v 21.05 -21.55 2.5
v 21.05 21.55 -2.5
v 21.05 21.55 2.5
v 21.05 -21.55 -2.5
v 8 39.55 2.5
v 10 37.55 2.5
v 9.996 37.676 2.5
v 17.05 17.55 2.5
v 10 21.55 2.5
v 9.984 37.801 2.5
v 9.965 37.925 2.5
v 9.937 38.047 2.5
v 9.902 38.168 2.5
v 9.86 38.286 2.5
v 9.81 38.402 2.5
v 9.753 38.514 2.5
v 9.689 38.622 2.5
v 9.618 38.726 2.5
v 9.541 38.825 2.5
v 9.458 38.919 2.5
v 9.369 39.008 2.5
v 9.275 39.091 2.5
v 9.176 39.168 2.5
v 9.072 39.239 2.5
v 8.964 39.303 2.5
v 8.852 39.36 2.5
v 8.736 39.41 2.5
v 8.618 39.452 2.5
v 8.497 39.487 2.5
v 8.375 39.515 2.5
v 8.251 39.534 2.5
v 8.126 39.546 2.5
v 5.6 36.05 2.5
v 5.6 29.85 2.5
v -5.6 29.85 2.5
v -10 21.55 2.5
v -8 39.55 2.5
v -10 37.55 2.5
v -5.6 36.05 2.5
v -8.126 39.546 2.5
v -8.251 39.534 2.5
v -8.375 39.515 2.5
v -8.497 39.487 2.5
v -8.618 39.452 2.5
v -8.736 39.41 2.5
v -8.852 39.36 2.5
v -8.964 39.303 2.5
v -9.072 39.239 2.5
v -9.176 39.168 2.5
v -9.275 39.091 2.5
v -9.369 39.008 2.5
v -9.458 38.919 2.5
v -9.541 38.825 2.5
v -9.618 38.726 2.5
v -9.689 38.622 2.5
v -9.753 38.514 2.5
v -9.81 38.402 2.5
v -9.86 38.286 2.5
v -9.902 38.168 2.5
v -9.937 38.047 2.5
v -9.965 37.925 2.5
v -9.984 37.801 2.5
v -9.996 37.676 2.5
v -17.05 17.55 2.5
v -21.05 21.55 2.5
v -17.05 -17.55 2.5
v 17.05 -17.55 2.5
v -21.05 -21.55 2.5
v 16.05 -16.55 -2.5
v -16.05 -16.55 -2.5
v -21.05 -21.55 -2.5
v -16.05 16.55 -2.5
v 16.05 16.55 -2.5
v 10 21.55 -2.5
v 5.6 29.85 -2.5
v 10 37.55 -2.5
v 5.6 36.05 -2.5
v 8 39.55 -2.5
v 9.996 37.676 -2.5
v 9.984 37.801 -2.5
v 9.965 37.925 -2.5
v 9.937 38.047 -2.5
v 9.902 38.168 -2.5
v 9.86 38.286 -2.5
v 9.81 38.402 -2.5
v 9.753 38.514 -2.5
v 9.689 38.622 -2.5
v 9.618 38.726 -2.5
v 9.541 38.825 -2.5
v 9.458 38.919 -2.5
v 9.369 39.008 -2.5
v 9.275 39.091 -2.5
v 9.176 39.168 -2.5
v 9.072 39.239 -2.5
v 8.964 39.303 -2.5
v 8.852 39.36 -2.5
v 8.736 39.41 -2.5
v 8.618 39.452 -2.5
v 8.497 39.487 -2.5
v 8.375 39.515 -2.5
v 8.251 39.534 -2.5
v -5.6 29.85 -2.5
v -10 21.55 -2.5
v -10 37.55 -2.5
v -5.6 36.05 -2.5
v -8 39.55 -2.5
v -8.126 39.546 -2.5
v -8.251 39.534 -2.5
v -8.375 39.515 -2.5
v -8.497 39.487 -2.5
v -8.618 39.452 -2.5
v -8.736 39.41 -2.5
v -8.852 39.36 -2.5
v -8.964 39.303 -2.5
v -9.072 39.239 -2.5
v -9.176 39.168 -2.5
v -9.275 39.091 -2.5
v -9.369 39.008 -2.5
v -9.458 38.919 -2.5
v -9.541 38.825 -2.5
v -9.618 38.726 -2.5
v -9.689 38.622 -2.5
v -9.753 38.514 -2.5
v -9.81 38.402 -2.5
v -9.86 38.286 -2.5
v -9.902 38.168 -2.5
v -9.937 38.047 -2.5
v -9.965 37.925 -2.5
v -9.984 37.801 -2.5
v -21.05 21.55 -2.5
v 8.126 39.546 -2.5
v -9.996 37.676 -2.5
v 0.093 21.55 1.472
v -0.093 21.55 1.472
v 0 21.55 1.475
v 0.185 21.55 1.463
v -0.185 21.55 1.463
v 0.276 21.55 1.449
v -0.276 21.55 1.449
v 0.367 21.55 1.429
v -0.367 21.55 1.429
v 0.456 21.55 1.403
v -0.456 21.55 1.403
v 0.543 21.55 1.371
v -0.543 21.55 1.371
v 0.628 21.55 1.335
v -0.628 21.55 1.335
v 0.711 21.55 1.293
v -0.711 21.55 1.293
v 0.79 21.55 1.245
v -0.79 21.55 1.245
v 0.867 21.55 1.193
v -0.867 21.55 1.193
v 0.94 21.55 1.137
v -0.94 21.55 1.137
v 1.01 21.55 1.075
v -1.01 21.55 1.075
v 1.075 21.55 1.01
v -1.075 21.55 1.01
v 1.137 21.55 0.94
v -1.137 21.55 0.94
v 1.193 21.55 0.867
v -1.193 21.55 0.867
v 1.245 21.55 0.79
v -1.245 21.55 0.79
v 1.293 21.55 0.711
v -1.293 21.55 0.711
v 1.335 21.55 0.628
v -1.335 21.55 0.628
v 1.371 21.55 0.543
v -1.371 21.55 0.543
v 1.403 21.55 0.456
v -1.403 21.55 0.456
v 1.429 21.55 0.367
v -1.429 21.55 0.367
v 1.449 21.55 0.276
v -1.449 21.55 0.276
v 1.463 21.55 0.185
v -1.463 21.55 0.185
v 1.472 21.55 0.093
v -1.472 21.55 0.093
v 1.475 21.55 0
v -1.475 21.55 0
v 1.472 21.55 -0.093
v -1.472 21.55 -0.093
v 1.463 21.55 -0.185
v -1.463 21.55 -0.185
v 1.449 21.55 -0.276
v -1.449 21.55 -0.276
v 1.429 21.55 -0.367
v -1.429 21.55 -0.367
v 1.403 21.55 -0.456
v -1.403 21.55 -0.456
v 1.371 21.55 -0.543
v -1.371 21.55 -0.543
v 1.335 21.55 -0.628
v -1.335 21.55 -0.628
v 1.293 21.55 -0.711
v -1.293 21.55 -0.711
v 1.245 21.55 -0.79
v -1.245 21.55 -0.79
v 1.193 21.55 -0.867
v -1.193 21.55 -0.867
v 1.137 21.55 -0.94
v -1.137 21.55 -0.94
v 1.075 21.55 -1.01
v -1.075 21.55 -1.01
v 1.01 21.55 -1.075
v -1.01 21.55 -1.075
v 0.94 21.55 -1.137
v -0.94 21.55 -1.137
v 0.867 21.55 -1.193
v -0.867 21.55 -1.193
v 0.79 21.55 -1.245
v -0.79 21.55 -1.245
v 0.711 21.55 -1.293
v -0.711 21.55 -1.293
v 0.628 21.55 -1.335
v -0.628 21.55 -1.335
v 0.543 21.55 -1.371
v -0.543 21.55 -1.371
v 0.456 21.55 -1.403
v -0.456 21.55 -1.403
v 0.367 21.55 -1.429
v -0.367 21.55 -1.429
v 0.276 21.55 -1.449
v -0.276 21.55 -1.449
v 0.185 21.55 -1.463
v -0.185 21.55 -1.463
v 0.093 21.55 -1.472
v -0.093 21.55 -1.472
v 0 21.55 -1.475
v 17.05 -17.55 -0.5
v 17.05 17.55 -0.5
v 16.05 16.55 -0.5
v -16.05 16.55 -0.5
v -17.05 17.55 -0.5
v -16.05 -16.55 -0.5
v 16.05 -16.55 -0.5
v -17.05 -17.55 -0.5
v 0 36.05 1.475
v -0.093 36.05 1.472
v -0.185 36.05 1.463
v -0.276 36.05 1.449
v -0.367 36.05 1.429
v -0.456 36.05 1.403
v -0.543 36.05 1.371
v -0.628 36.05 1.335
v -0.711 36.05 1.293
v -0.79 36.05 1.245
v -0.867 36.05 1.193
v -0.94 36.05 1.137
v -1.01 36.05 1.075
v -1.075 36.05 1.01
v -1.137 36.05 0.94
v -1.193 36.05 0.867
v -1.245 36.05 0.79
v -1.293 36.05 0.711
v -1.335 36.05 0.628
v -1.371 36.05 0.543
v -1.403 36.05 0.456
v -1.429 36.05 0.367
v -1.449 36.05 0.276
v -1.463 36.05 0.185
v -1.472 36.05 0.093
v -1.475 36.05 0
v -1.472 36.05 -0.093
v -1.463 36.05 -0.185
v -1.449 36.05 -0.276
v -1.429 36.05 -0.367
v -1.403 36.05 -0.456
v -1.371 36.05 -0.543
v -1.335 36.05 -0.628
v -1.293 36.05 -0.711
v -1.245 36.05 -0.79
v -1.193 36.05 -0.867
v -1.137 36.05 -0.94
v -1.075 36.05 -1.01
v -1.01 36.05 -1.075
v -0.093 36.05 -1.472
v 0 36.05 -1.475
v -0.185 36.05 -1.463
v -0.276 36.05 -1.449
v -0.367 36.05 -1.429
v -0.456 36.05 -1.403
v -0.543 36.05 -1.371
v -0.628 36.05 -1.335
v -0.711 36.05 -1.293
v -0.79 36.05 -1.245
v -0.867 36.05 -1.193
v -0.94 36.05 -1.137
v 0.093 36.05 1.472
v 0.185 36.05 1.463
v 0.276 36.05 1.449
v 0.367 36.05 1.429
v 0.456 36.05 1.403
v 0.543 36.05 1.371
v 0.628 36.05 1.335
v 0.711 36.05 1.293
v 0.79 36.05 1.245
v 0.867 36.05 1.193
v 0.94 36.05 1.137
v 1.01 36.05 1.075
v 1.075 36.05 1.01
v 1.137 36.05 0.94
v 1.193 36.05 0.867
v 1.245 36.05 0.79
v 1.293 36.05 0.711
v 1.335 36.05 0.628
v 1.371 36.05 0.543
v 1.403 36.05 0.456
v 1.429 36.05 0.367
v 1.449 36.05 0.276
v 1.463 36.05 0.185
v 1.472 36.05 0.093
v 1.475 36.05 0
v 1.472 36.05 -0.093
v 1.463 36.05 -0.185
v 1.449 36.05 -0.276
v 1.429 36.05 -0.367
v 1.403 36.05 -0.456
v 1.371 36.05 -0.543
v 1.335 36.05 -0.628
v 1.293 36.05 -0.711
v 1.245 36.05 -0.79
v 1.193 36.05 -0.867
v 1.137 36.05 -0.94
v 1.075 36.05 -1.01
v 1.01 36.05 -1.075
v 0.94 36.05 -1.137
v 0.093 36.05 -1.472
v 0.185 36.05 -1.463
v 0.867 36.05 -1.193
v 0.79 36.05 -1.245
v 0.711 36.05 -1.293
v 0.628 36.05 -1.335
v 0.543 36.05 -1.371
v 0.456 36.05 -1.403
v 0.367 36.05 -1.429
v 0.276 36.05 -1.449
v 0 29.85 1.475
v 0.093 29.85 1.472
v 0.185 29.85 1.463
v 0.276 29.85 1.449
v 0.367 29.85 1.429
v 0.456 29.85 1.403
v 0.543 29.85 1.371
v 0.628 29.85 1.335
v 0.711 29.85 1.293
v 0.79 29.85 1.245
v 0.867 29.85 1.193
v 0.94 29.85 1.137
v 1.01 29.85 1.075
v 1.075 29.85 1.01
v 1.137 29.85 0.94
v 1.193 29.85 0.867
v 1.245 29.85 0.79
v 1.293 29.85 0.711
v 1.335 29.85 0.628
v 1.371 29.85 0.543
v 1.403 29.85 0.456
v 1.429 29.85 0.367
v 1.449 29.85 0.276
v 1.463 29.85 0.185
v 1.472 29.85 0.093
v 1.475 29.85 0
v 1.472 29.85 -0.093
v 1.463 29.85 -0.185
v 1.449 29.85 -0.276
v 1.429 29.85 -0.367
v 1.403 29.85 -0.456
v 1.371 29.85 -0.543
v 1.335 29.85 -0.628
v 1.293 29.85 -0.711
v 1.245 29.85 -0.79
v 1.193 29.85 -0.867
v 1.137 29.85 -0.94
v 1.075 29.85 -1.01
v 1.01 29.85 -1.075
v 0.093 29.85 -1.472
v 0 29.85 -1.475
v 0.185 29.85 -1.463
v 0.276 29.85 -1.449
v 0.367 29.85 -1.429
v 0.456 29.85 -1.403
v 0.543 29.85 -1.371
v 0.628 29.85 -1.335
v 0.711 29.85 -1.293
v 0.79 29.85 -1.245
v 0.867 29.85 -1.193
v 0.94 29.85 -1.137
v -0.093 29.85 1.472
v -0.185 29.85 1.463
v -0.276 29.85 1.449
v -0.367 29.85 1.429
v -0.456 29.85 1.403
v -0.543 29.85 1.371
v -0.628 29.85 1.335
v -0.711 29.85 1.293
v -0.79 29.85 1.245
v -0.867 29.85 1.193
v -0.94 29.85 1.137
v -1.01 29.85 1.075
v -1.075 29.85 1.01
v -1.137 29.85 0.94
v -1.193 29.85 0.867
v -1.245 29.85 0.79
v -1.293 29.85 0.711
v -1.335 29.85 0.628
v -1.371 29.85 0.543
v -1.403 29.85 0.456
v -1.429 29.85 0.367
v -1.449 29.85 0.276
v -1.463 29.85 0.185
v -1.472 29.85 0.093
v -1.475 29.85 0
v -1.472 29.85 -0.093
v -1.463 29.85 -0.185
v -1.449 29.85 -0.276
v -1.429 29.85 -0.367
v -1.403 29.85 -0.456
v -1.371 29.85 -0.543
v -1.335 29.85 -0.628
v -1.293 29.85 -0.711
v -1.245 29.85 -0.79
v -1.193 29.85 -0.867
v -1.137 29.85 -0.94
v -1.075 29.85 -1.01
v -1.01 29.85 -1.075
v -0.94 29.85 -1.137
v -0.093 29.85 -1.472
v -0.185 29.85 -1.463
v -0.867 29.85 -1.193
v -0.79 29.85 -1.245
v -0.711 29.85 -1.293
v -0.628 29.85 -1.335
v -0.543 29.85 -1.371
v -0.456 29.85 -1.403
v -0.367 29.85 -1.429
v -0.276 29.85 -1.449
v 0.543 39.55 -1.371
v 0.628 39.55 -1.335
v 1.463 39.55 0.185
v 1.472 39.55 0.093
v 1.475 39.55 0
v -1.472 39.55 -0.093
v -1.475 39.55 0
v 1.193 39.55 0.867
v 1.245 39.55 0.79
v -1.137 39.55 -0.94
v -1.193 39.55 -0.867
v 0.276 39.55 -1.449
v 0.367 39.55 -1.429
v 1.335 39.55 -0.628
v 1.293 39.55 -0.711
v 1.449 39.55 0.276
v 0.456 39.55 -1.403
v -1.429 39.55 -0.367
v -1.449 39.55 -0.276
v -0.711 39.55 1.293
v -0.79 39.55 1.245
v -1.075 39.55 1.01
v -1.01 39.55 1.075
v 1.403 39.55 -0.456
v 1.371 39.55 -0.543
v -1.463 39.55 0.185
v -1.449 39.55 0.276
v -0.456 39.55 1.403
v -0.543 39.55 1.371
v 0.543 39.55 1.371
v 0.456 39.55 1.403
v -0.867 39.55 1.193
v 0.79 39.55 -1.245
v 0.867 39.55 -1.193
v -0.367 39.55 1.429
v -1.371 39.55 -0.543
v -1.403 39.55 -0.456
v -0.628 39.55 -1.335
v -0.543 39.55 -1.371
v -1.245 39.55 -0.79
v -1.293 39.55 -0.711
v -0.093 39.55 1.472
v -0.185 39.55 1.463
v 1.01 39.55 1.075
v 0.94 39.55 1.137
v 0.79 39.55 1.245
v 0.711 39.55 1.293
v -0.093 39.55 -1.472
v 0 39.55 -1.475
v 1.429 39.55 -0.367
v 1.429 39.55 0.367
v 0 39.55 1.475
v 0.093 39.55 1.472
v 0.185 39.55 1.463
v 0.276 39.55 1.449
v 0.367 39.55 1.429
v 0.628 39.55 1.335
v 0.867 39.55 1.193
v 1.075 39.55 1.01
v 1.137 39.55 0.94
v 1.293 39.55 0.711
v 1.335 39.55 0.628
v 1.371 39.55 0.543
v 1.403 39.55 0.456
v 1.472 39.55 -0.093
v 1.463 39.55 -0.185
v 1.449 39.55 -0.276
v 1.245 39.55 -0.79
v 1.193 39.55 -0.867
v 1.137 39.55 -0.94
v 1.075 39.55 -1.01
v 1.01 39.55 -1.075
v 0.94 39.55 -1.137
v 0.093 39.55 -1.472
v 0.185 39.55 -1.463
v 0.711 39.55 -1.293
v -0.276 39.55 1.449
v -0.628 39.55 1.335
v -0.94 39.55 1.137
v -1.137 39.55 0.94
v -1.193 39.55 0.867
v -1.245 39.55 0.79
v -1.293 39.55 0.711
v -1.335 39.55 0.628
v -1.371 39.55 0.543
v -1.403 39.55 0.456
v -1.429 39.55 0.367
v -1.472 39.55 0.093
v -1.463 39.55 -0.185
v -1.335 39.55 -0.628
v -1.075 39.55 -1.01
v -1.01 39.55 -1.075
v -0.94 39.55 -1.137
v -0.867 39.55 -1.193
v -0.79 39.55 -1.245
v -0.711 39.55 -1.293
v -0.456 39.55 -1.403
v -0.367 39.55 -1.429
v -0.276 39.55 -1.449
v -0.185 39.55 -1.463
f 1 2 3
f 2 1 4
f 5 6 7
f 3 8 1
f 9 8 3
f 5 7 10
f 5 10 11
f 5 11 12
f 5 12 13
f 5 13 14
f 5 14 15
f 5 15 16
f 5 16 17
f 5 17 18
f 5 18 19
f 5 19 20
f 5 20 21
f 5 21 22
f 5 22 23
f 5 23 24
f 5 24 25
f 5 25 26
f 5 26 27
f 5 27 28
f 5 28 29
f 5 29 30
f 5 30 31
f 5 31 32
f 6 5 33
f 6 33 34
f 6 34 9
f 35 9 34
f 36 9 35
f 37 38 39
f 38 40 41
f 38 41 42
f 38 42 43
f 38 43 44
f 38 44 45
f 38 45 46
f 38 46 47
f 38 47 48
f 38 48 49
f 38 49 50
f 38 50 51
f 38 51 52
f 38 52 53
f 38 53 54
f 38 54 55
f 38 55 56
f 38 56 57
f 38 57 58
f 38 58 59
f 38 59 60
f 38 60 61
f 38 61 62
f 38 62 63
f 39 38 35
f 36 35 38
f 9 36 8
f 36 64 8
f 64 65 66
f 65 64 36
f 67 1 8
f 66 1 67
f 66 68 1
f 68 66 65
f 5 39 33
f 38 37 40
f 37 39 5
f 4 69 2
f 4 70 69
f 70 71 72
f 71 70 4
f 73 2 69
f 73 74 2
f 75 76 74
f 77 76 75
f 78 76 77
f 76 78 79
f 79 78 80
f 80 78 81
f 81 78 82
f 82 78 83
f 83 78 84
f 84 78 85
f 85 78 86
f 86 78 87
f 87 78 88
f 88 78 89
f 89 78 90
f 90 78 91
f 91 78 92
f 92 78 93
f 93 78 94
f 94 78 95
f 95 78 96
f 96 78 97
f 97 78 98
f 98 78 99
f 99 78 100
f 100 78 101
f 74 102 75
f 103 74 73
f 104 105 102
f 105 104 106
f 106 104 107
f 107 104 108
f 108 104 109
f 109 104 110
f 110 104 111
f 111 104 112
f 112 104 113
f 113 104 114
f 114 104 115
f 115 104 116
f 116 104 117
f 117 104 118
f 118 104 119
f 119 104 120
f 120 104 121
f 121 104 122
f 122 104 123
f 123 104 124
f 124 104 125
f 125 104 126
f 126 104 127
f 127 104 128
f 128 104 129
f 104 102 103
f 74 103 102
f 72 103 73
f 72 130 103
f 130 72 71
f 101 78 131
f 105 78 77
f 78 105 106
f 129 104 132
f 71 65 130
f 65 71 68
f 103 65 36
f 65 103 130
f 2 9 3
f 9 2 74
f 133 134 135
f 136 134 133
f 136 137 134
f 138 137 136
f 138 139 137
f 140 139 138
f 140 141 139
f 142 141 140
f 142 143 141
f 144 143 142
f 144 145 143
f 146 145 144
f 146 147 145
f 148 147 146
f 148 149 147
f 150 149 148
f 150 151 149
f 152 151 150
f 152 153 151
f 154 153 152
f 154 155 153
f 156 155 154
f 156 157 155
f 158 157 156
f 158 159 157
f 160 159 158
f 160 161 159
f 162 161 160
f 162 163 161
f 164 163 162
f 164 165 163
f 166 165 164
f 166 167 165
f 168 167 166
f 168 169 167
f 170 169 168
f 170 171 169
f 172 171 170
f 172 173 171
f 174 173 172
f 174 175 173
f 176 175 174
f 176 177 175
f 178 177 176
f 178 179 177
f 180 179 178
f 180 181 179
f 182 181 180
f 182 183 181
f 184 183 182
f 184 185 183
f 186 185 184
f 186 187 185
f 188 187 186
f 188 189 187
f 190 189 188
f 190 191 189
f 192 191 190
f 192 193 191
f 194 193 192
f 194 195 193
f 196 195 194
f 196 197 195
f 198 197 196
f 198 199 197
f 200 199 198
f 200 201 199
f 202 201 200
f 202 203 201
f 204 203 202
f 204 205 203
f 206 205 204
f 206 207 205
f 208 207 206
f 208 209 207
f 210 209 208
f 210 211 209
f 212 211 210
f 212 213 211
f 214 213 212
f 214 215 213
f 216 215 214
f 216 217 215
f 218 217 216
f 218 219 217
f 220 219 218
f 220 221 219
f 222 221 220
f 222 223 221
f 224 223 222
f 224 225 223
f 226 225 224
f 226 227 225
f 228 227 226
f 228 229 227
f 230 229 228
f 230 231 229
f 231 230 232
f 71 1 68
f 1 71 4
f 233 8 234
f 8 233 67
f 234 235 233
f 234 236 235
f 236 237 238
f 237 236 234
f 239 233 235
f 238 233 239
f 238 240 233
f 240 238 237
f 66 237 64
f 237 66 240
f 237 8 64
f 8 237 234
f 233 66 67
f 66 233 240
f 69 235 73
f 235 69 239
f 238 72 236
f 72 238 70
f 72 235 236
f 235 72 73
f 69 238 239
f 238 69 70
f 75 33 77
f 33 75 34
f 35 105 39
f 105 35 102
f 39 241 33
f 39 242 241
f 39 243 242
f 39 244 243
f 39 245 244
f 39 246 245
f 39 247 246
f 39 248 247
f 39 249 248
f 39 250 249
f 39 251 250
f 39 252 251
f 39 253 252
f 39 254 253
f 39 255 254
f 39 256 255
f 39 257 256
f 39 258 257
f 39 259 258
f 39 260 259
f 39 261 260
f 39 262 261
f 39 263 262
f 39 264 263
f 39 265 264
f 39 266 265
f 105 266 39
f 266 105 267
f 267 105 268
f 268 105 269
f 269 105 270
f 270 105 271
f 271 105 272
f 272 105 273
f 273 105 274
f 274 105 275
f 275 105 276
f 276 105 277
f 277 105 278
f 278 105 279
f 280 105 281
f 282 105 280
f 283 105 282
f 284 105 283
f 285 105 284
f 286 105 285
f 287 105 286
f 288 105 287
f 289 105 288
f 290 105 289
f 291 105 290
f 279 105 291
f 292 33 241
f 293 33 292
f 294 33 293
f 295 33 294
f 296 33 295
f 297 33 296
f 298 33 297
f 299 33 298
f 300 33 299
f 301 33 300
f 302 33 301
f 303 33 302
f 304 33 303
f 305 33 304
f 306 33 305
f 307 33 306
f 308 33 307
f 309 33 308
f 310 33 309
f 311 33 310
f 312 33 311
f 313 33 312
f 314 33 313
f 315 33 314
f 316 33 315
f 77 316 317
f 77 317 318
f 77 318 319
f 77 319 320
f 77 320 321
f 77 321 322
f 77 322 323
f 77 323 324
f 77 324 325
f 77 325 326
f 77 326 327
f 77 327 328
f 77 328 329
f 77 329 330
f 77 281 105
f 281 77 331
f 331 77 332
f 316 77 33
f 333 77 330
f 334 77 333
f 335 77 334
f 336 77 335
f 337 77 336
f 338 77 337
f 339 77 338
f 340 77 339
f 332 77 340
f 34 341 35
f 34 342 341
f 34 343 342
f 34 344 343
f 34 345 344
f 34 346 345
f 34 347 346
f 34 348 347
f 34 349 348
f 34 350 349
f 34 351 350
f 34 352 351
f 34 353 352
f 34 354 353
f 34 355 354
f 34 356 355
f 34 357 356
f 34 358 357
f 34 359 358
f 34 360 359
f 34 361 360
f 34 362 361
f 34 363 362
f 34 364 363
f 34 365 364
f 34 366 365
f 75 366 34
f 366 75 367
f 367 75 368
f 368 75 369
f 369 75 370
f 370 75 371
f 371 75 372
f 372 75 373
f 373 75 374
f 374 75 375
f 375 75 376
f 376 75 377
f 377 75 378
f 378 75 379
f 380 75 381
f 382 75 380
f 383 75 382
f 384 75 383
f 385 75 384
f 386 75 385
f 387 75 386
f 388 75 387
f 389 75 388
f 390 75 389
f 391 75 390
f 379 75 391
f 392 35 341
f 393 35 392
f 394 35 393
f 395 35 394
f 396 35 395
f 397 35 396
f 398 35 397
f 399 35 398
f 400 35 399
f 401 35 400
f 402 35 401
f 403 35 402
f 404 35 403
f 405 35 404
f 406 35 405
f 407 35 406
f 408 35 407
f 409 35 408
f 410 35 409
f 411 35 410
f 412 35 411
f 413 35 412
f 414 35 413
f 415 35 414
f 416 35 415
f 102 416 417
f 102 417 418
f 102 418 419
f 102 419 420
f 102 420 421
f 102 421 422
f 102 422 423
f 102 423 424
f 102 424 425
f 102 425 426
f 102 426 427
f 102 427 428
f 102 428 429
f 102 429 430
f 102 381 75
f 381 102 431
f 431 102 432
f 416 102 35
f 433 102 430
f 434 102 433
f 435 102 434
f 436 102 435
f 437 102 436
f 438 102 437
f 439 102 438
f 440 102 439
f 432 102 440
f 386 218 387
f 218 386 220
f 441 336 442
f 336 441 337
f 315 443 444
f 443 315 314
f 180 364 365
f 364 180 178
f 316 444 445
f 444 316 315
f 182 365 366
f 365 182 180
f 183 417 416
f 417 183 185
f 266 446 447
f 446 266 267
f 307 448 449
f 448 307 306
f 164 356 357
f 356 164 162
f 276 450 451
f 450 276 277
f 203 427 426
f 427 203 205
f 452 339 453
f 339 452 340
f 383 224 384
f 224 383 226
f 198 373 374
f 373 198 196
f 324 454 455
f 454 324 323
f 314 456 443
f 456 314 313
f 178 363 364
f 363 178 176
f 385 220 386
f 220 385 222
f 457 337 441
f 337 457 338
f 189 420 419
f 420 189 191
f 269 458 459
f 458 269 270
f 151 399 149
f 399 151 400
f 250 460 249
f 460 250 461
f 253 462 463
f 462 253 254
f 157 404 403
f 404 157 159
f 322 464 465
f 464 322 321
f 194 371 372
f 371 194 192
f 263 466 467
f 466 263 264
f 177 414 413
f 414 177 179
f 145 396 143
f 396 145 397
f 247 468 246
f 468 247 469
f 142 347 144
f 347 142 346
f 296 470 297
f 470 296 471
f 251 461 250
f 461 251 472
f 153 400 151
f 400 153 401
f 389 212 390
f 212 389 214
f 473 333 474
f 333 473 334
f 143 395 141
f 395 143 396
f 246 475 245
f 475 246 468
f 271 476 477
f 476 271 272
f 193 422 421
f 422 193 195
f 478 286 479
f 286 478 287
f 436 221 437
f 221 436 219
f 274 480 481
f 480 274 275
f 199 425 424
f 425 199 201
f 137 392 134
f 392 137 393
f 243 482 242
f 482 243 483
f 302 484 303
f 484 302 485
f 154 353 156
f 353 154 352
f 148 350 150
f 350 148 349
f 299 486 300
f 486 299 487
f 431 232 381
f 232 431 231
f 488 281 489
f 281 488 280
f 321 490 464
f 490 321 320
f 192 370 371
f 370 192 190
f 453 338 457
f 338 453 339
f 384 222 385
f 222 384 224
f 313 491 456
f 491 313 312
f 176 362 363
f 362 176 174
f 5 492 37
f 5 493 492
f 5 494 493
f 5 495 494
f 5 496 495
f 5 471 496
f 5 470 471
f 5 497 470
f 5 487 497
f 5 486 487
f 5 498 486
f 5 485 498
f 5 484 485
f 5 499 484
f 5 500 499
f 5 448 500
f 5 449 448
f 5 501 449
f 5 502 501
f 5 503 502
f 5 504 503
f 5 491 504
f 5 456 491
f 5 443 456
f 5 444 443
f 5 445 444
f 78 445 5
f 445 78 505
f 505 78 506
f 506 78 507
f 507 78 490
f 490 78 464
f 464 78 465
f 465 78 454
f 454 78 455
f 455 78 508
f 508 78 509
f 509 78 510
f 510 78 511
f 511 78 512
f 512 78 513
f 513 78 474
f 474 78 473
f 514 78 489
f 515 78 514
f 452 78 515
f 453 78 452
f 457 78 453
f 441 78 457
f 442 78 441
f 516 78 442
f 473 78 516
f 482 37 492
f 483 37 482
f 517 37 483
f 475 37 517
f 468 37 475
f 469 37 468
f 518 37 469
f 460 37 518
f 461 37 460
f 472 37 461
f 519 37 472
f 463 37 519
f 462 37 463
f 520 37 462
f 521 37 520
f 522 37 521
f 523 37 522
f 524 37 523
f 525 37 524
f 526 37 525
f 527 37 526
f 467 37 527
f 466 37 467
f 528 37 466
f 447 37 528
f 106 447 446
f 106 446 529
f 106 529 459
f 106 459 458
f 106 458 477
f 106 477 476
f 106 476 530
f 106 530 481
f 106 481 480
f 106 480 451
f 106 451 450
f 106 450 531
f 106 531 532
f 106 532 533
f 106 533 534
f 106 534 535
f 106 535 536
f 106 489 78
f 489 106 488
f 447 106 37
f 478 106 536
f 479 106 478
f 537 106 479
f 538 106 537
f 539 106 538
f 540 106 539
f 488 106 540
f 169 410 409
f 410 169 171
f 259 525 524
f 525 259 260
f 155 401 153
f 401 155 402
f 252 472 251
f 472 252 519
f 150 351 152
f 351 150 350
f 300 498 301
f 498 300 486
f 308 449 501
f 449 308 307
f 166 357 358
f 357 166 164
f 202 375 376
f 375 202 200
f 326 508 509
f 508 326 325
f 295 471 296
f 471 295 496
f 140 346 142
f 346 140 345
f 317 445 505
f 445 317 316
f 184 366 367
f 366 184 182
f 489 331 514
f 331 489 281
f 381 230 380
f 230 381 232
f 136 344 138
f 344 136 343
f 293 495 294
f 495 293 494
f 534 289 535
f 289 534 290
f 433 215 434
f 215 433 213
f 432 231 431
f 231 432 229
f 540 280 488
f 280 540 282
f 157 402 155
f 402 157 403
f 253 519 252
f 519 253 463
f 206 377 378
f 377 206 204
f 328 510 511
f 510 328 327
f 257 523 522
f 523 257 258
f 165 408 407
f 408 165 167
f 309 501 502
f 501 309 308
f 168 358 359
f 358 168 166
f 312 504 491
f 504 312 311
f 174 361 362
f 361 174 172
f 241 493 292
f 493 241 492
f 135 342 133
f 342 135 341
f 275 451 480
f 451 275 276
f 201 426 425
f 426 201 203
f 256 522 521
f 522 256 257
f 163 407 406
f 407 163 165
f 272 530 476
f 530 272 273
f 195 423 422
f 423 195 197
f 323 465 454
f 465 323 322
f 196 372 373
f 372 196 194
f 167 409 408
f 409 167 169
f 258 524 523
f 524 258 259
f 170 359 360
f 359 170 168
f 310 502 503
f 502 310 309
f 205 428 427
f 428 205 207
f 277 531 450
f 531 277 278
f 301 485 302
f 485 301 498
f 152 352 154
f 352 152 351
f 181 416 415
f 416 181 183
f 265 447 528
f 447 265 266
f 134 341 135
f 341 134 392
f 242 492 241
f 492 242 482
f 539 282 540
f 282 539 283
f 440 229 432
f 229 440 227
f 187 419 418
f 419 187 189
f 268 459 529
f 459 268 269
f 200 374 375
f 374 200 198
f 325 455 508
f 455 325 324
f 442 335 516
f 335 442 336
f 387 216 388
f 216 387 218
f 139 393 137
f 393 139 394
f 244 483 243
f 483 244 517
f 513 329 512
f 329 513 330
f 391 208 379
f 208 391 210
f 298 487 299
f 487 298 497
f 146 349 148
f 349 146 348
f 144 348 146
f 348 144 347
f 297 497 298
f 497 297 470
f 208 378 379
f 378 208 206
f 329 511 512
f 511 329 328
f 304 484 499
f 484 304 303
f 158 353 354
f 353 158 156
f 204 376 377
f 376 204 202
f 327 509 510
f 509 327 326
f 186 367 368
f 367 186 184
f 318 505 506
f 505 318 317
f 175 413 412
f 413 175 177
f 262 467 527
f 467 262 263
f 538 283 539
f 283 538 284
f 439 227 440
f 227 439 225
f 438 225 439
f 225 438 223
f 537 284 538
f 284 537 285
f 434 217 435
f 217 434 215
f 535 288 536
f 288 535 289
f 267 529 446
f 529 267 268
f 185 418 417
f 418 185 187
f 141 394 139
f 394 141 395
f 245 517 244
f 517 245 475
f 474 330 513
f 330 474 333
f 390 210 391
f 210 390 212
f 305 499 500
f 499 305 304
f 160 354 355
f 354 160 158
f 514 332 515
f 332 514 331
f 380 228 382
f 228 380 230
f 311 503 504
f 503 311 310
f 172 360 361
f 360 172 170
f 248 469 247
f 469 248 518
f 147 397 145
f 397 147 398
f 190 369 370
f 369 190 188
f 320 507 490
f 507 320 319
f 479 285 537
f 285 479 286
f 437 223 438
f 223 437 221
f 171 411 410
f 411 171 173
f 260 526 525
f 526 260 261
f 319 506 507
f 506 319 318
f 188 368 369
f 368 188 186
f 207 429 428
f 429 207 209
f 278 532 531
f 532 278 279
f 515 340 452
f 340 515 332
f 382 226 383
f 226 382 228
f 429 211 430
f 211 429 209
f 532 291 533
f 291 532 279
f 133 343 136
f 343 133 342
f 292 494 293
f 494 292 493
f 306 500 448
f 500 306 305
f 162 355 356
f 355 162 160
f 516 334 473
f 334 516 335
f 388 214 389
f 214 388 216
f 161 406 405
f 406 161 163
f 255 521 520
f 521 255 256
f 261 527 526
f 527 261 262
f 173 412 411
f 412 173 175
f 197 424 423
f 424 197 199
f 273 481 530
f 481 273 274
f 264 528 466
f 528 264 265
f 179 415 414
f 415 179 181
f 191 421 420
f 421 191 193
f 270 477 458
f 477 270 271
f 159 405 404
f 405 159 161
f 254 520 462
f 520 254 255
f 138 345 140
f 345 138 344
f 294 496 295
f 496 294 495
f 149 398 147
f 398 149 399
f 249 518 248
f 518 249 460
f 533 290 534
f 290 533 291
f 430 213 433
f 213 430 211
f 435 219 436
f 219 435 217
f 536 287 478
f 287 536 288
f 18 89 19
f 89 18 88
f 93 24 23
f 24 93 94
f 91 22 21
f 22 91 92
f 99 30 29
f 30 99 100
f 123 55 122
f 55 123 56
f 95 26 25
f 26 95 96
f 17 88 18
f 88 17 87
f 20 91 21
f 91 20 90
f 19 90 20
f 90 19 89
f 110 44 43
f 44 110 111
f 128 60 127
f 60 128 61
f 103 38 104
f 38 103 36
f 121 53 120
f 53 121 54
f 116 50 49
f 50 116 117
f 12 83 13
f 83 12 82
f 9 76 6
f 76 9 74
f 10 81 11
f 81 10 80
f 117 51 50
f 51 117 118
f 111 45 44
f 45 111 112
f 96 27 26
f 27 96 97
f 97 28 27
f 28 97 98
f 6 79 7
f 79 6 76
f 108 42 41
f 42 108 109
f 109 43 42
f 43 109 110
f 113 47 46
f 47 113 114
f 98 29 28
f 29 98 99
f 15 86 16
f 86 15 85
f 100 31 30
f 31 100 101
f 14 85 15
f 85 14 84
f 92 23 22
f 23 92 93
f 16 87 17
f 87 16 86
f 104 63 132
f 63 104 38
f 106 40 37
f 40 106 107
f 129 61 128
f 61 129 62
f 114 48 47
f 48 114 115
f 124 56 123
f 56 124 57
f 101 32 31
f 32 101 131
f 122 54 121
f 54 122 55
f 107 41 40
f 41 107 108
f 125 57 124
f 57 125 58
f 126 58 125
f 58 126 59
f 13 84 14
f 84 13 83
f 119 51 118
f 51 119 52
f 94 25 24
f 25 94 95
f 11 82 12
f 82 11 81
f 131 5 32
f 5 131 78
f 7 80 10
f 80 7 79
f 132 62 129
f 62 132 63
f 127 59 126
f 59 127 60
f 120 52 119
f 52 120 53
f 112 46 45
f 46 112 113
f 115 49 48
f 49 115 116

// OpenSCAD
// file: library/square_mount.scad
posx = 20;
posy = 22;
posz = 5;
negx = 10;
negy = 5;
negz = posz+1;
screwd=2.95;



$fn=100;

module attachment(posx,posy,posz,negx,negy,negz,screwd){
difference(){
    minkowski()
    {
    cube([posx-4,posy-4,posz-1],center=true);
        cylinder(r=2,h=1, center=true);
        }//minkowski
union(){
    translate([0,posy/5,0]){
    cube([negx,negy,negz],center=true);
    }
    rotate([90,0,0]){
        cylinder(d=screwd,h=posy,center=true,$fn=100);
        }
    }

    }
}

//attachment(posx,posy,posz,negx,negy,negz,screwd);
// main file
include<library/square_mount.scad>


tolerance = 0.2; // Global gap between all parts that need to slide
partThick = 5;

screwD = 2.95;

fityHole = 6;
fitxHole = 11;

fity = 22;
fitx = 20;

heatDissX=34.1;
heatDissY=35.1;

difference(){
//positive
cube([heatDissX+8,heatDissY+8,partThick],center=true);
//negative
translate([0,0,partThick-3]){
    cube([heatDissX,heatDissY,partThick],center=true);

}
cube([heatDissX-2,heatDissY-2,partThick],center=true);
}

translate([0,heatDissY/2+fity/2,0]){
    attachment(posx=fitx,
            posy=fity,
            posz=partThick,
            negx=fitxHole+tolerance,
            negy=fityHole+tolerance,
            negz=partThick,
            screwd=screwD);
}
